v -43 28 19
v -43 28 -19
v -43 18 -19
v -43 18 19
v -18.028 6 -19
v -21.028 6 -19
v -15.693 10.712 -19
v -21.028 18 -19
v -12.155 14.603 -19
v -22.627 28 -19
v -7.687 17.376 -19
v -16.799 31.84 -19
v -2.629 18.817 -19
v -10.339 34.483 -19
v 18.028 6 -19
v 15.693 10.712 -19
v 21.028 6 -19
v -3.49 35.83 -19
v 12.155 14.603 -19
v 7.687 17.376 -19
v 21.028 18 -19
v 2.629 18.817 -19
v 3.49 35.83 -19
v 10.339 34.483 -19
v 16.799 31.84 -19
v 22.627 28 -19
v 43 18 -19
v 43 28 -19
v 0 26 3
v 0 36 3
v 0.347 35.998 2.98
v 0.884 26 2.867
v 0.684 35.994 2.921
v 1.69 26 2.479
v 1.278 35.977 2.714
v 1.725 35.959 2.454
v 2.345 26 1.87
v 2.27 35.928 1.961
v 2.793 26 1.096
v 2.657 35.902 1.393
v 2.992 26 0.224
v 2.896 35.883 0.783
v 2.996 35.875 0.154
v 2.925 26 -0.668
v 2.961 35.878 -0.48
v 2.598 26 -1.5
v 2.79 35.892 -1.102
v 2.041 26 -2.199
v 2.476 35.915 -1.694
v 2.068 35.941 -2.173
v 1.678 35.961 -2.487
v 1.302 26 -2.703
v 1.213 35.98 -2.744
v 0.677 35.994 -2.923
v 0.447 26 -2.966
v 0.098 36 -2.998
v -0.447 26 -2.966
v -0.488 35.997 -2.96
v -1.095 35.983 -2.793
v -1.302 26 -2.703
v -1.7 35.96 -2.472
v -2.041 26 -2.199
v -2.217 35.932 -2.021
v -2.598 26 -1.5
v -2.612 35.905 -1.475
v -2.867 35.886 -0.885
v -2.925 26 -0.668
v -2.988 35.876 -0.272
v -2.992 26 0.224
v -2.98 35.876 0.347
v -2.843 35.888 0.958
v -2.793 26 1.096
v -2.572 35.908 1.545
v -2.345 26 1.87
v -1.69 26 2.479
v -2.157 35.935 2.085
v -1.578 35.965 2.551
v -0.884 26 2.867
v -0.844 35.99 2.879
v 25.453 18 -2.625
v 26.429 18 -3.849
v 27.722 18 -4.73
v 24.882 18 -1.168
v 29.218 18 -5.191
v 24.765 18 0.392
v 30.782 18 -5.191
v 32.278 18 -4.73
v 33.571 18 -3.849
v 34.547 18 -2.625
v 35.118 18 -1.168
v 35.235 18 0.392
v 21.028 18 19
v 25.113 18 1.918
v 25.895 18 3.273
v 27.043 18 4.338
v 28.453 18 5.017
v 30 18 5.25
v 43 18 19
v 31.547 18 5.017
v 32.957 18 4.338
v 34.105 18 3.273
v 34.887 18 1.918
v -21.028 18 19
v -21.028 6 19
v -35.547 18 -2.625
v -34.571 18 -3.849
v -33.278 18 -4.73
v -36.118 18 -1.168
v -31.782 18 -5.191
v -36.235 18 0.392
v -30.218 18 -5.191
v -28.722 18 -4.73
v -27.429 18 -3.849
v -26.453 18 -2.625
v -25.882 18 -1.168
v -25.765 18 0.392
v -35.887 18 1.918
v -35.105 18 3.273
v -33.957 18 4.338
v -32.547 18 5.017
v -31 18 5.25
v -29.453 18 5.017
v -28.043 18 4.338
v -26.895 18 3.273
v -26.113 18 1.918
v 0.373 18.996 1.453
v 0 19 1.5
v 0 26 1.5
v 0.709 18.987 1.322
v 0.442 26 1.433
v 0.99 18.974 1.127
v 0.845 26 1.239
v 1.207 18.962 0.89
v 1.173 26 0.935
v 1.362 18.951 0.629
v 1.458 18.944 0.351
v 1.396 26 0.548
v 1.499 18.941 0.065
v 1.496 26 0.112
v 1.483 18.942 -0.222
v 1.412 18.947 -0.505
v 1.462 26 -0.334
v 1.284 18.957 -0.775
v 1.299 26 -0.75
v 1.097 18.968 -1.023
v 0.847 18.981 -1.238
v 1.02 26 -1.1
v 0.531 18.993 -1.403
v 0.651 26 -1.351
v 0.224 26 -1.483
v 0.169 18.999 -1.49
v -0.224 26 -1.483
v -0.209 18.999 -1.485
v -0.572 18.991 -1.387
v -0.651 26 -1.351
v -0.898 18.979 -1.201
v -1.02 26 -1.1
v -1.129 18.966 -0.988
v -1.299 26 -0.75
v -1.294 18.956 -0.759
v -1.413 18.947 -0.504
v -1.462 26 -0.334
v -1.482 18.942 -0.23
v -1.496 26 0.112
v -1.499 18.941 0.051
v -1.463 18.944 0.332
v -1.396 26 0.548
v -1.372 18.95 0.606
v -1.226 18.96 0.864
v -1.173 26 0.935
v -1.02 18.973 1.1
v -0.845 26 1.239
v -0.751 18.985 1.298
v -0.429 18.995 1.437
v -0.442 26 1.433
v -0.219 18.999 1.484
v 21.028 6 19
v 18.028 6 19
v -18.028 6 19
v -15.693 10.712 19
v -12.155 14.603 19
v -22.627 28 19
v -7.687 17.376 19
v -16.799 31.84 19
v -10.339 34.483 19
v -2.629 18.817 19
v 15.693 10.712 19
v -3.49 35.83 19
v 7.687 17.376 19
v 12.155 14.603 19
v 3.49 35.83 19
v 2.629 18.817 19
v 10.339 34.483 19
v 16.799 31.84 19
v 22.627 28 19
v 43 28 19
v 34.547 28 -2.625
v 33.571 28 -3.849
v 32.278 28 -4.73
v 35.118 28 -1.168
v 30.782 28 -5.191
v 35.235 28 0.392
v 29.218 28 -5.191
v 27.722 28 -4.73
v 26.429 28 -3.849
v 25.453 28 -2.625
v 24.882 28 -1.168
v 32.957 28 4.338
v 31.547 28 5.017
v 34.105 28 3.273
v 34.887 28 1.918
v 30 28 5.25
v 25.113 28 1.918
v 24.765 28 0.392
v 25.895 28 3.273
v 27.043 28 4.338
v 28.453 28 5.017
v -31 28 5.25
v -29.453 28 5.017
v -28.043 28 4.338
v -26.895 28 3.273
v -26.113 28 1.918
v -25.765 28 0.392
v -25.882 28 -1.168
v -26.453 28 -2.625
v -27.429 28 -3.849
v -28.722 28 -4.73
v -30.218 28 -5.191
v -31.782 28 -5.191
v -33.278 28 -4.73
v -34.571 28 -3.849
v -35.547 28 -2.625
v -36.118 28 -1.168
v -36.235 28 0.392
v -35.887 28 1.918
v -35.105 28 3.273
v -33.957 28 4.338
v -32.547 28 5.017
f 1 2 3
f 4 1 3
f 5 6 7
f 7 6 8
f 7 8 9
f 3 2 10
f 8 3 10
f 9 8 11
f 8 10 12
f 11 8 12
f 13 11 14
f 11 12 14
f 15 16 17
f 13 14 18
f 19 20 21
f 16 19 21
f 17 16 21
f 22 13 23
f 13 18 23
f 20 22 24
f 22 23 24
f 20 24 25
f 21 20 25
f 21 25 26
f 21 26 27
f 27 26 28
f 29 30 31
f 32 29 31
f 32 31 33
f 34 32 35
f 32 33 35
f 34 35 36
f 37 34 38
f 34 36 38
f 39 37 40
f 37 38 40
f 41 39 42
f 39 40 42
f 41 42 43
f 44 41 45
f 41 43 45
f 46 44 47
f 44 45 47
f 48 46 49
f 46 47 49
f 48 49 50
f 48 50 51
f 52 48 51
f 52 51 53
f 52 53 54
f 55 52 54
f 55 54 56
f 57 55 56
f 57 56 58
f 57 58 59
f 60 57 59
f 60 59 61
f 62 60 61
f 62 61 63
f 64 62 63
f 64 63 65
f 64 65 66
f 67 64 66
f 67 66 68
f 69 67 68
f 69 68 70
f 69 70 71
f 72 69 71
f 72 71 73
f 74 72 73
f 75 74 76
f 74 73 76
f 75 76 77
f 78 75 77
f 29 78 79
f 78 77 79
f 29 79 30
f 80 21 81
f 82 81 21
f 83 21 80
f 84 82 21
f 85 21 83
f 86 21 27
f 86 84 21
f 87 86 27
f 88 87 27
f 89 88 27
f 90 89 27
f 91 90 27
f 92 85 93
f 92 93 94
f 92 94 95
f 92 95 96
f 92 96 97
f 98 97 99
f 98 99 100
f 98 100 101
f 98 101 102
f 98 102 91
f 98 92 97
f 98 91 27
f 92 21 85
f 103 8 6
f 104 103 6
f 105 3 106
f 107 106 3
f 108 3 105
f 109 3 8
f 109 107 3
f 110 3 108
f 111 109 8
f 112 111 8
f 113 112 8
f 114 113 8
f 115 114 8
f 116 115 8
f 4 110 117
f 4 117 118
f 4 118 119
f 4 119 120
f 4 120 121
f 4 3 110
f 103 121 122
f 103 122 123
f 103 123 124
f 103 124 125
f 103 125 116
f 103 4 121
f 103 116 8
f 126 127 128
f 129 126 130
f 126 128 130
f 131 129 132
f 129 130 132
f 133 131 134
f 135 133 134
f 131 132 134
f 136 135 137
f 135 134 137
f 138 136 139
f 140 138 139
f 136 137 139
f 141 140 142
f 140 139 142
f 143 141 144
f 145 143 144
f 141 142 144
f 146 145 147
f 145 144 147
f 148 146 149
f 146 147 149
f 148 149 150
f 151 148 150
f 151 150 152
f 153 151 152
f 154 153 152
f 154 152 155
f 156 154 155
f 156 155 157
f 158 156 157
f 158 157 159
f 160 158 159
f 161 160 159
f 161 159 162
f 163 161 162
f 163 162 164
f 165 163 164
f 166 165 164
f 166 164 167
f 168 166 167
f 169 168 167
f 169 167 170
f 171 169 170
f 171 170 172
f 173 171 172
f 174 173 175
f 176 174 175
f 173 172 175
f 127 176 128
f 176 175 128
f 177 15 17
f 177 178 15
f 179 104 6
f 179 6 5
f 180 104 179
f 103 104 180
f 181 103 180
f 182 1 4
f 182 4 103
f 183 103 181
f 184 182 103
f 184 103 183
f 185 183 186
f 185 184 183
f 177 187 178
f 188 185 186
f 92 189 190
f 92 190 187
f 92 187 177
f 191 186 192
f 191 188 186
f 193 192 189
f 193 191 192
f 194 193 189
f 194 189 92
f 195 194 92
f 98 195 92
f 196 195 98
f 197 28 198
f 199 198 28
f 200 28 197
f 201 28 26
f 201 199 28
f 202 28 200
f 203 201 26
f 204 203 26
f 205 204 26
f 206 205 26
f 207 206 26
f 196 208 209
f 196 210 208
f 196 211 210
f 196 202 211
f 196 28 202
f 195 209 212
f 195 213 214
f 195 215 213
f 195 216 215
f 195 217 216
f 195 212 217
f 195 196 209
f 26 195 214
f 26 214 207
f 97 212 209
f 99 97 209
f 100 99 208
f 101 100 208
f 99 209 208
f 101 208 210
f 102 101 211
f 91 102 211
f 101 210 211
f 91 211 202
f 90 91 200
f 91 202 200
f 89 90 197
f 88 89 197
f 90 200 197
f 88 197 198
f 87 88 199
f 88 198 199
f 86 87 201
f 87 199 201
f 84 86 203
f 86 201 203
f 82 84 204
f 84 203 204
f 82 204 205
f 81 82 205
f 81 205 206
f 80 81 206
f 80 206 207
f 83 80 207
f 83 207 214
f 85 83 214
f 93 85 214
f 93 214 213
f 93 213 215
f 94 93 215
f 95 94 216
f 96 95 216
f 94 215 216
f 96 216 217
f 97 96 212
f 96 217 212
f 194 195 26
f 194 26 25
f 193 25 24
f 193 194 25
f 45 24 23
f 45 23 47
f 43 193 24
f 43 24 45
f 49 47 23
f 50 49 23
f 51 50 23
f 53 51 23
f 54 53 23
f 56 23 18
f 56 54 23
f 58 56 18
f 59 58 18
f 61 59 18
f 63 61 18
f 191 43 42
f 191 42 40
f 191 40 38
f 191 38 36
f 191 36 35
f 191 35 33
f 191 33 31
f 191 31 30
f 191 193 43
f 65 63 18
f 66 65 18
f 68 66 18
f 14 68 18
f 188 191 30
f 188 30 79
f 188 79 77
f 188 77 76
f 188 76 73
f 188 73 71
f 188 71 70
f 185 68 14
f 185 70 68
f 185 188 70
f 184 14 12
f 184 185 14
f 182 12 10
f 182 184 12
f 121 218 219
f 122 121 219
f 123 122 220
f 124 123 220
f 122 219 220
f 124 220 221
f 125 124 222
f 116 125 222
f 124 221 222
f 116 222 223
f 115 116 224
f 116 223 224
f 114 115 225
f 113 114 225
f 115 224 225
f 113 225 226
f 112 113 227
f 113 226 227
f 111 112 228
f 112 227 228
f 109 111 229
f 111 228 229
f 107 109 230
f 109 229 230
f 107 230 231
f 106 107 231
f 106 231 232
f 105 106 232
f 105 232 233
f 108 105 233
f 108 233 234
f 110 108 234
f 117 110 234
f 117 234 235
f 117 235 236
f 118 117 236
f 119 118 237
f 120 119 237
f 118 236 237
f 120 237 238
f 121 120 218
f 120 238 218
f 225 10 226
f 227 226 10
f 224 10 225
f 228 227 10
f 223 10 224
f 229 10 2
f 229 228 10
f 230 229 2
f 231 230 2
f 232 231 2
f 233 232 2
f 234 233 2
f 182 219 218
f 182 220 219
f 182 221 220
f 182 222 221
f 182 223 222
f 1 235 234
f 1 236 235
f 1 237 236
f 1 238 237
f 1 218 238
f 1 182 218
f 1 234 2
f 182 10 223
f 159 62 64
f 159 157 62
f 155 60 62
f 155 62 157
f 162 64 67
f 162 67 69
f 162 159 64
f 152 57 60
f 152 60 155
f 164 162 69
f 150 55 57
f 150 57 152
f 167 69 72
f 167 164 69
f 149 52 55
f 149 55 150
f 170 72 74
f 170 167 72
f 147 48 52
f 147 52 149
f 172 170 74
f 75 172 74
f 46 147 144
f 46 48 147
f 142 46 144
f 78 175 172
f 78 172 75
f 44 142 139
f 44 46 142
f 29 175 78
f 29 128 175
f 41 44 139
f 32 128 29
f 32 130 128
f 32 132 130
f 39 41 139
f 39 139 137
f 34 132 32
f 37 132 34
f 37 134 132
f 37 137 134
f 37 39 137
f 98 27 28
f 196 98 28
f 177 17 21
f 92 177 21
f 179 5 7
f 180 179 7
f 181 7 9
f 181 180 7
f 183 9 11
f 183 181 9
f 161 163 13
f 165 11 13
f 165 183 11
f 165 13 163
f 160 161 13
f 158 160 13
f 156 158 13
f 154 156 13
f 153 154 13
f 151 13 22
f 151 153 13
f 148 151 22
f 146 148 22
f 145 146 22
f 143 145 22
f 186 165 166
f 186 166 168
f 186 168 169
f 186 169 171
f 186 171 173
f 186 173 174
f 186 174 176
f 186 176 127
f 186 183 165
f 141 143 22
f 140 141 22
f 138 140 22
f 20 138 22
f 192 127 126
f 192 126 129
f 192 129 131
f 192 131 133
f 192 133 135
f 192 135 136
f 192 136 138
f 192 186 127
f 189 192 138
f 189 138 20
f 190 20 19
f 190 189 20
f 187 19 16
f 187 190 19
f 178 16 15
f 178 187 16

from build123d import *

# Parameters (mm, degrees)
BOSS_EXTRUDE1_DEPTH = 19
SKETCH3_R           = 1.5
CUT_EXTRUDE2_DEPTH  = 18
SKETCH2_R           = 5.25
CUT_EXTRUDE4_DEPTH  = 10
SKETCH4_R           = 3
CUT_EXTRUDE5_DEPTH  = 10


with BuildPart() as part:
    # Sketch1 → Boss-Extrude1 (new, symmetric)
    with BuildSketch(Plane.XY):
        with BuildLine():
            Line((21.027756377, 6), (21.027756377, 18))
            Line((21.027756377, 18), (43, 18))
            Line((43, 18), (43, 28))
            Line((43, 28), (22.627416998, 28))
            ThreePointArc((22.627416998, 28), (0, 36), (-22.627416998, 28))
            Line((-22.627416998, 28), (-43, 28))
            Line((-43, 28), (-43, 18))
            Line((-43, 18), (-21.027756377, 18))
            Line((-21.027756377, 18), (-21.027756377, 6))
            Line((-21.027756377, 6), (-18.027756377, 6))
            ThreePointArc((-18.027756377, 6), (0, 19), (18.027756377, 6))
            Line((18.027756377, 6), (21.027756377, 6))
        make_face()
    extrude(amount=BOSS_EXTRUDE1_DEPTH, both=True)

    # Sketch3 → Cut-Extrude2 (cut)
    with BuildSketch(Plane(origin=(0, 36, 0), x_dir=(1, 0, 0), z_dir=(0, 1, 0))):
        with Locations(Location((0, 0, 0), (0, 0, 270))):
            Circle(SKETCH3_R)
    extrude(amount=-CUT_EXTRUDE2_DEPTH, mode=Mode.SUBTRACT)

    # Sketch2 → Cut-Extrude4 (cut)
    with BuildSketch(Plane(origin=(0, 28, 0), x_dir=(1, 0, 0), z_dir=(0, 1, 0))):
        with Locations(Location((30, 0, 0), (0, 0, 270))):
            Circle(SKETCH2_R)
        with Locations(Location((-31, 0, 0), (0, 0, 270))):
            Circle(SKETCH2_R)
    extrude(amount=-CUT_EXTRUDE4_DEPTH, mode=Mode.SUBTRACT)

    # Sketch4 → Cut-Extrude5 (cut)
    with BuildSketch(Plane(origin=(0, 36, 0), x_dir=(1, 0, 0), z_dir=(0, 1, 0))):
        with Locations(Location((0, 0, 0), (0, 0, 270))):
            Circle(SKETCH4_R)
    extrude(amount=-CUT_EXTRUDE5_DEPTH, mode=Mode.SUBTRACT)


solid = part.part
